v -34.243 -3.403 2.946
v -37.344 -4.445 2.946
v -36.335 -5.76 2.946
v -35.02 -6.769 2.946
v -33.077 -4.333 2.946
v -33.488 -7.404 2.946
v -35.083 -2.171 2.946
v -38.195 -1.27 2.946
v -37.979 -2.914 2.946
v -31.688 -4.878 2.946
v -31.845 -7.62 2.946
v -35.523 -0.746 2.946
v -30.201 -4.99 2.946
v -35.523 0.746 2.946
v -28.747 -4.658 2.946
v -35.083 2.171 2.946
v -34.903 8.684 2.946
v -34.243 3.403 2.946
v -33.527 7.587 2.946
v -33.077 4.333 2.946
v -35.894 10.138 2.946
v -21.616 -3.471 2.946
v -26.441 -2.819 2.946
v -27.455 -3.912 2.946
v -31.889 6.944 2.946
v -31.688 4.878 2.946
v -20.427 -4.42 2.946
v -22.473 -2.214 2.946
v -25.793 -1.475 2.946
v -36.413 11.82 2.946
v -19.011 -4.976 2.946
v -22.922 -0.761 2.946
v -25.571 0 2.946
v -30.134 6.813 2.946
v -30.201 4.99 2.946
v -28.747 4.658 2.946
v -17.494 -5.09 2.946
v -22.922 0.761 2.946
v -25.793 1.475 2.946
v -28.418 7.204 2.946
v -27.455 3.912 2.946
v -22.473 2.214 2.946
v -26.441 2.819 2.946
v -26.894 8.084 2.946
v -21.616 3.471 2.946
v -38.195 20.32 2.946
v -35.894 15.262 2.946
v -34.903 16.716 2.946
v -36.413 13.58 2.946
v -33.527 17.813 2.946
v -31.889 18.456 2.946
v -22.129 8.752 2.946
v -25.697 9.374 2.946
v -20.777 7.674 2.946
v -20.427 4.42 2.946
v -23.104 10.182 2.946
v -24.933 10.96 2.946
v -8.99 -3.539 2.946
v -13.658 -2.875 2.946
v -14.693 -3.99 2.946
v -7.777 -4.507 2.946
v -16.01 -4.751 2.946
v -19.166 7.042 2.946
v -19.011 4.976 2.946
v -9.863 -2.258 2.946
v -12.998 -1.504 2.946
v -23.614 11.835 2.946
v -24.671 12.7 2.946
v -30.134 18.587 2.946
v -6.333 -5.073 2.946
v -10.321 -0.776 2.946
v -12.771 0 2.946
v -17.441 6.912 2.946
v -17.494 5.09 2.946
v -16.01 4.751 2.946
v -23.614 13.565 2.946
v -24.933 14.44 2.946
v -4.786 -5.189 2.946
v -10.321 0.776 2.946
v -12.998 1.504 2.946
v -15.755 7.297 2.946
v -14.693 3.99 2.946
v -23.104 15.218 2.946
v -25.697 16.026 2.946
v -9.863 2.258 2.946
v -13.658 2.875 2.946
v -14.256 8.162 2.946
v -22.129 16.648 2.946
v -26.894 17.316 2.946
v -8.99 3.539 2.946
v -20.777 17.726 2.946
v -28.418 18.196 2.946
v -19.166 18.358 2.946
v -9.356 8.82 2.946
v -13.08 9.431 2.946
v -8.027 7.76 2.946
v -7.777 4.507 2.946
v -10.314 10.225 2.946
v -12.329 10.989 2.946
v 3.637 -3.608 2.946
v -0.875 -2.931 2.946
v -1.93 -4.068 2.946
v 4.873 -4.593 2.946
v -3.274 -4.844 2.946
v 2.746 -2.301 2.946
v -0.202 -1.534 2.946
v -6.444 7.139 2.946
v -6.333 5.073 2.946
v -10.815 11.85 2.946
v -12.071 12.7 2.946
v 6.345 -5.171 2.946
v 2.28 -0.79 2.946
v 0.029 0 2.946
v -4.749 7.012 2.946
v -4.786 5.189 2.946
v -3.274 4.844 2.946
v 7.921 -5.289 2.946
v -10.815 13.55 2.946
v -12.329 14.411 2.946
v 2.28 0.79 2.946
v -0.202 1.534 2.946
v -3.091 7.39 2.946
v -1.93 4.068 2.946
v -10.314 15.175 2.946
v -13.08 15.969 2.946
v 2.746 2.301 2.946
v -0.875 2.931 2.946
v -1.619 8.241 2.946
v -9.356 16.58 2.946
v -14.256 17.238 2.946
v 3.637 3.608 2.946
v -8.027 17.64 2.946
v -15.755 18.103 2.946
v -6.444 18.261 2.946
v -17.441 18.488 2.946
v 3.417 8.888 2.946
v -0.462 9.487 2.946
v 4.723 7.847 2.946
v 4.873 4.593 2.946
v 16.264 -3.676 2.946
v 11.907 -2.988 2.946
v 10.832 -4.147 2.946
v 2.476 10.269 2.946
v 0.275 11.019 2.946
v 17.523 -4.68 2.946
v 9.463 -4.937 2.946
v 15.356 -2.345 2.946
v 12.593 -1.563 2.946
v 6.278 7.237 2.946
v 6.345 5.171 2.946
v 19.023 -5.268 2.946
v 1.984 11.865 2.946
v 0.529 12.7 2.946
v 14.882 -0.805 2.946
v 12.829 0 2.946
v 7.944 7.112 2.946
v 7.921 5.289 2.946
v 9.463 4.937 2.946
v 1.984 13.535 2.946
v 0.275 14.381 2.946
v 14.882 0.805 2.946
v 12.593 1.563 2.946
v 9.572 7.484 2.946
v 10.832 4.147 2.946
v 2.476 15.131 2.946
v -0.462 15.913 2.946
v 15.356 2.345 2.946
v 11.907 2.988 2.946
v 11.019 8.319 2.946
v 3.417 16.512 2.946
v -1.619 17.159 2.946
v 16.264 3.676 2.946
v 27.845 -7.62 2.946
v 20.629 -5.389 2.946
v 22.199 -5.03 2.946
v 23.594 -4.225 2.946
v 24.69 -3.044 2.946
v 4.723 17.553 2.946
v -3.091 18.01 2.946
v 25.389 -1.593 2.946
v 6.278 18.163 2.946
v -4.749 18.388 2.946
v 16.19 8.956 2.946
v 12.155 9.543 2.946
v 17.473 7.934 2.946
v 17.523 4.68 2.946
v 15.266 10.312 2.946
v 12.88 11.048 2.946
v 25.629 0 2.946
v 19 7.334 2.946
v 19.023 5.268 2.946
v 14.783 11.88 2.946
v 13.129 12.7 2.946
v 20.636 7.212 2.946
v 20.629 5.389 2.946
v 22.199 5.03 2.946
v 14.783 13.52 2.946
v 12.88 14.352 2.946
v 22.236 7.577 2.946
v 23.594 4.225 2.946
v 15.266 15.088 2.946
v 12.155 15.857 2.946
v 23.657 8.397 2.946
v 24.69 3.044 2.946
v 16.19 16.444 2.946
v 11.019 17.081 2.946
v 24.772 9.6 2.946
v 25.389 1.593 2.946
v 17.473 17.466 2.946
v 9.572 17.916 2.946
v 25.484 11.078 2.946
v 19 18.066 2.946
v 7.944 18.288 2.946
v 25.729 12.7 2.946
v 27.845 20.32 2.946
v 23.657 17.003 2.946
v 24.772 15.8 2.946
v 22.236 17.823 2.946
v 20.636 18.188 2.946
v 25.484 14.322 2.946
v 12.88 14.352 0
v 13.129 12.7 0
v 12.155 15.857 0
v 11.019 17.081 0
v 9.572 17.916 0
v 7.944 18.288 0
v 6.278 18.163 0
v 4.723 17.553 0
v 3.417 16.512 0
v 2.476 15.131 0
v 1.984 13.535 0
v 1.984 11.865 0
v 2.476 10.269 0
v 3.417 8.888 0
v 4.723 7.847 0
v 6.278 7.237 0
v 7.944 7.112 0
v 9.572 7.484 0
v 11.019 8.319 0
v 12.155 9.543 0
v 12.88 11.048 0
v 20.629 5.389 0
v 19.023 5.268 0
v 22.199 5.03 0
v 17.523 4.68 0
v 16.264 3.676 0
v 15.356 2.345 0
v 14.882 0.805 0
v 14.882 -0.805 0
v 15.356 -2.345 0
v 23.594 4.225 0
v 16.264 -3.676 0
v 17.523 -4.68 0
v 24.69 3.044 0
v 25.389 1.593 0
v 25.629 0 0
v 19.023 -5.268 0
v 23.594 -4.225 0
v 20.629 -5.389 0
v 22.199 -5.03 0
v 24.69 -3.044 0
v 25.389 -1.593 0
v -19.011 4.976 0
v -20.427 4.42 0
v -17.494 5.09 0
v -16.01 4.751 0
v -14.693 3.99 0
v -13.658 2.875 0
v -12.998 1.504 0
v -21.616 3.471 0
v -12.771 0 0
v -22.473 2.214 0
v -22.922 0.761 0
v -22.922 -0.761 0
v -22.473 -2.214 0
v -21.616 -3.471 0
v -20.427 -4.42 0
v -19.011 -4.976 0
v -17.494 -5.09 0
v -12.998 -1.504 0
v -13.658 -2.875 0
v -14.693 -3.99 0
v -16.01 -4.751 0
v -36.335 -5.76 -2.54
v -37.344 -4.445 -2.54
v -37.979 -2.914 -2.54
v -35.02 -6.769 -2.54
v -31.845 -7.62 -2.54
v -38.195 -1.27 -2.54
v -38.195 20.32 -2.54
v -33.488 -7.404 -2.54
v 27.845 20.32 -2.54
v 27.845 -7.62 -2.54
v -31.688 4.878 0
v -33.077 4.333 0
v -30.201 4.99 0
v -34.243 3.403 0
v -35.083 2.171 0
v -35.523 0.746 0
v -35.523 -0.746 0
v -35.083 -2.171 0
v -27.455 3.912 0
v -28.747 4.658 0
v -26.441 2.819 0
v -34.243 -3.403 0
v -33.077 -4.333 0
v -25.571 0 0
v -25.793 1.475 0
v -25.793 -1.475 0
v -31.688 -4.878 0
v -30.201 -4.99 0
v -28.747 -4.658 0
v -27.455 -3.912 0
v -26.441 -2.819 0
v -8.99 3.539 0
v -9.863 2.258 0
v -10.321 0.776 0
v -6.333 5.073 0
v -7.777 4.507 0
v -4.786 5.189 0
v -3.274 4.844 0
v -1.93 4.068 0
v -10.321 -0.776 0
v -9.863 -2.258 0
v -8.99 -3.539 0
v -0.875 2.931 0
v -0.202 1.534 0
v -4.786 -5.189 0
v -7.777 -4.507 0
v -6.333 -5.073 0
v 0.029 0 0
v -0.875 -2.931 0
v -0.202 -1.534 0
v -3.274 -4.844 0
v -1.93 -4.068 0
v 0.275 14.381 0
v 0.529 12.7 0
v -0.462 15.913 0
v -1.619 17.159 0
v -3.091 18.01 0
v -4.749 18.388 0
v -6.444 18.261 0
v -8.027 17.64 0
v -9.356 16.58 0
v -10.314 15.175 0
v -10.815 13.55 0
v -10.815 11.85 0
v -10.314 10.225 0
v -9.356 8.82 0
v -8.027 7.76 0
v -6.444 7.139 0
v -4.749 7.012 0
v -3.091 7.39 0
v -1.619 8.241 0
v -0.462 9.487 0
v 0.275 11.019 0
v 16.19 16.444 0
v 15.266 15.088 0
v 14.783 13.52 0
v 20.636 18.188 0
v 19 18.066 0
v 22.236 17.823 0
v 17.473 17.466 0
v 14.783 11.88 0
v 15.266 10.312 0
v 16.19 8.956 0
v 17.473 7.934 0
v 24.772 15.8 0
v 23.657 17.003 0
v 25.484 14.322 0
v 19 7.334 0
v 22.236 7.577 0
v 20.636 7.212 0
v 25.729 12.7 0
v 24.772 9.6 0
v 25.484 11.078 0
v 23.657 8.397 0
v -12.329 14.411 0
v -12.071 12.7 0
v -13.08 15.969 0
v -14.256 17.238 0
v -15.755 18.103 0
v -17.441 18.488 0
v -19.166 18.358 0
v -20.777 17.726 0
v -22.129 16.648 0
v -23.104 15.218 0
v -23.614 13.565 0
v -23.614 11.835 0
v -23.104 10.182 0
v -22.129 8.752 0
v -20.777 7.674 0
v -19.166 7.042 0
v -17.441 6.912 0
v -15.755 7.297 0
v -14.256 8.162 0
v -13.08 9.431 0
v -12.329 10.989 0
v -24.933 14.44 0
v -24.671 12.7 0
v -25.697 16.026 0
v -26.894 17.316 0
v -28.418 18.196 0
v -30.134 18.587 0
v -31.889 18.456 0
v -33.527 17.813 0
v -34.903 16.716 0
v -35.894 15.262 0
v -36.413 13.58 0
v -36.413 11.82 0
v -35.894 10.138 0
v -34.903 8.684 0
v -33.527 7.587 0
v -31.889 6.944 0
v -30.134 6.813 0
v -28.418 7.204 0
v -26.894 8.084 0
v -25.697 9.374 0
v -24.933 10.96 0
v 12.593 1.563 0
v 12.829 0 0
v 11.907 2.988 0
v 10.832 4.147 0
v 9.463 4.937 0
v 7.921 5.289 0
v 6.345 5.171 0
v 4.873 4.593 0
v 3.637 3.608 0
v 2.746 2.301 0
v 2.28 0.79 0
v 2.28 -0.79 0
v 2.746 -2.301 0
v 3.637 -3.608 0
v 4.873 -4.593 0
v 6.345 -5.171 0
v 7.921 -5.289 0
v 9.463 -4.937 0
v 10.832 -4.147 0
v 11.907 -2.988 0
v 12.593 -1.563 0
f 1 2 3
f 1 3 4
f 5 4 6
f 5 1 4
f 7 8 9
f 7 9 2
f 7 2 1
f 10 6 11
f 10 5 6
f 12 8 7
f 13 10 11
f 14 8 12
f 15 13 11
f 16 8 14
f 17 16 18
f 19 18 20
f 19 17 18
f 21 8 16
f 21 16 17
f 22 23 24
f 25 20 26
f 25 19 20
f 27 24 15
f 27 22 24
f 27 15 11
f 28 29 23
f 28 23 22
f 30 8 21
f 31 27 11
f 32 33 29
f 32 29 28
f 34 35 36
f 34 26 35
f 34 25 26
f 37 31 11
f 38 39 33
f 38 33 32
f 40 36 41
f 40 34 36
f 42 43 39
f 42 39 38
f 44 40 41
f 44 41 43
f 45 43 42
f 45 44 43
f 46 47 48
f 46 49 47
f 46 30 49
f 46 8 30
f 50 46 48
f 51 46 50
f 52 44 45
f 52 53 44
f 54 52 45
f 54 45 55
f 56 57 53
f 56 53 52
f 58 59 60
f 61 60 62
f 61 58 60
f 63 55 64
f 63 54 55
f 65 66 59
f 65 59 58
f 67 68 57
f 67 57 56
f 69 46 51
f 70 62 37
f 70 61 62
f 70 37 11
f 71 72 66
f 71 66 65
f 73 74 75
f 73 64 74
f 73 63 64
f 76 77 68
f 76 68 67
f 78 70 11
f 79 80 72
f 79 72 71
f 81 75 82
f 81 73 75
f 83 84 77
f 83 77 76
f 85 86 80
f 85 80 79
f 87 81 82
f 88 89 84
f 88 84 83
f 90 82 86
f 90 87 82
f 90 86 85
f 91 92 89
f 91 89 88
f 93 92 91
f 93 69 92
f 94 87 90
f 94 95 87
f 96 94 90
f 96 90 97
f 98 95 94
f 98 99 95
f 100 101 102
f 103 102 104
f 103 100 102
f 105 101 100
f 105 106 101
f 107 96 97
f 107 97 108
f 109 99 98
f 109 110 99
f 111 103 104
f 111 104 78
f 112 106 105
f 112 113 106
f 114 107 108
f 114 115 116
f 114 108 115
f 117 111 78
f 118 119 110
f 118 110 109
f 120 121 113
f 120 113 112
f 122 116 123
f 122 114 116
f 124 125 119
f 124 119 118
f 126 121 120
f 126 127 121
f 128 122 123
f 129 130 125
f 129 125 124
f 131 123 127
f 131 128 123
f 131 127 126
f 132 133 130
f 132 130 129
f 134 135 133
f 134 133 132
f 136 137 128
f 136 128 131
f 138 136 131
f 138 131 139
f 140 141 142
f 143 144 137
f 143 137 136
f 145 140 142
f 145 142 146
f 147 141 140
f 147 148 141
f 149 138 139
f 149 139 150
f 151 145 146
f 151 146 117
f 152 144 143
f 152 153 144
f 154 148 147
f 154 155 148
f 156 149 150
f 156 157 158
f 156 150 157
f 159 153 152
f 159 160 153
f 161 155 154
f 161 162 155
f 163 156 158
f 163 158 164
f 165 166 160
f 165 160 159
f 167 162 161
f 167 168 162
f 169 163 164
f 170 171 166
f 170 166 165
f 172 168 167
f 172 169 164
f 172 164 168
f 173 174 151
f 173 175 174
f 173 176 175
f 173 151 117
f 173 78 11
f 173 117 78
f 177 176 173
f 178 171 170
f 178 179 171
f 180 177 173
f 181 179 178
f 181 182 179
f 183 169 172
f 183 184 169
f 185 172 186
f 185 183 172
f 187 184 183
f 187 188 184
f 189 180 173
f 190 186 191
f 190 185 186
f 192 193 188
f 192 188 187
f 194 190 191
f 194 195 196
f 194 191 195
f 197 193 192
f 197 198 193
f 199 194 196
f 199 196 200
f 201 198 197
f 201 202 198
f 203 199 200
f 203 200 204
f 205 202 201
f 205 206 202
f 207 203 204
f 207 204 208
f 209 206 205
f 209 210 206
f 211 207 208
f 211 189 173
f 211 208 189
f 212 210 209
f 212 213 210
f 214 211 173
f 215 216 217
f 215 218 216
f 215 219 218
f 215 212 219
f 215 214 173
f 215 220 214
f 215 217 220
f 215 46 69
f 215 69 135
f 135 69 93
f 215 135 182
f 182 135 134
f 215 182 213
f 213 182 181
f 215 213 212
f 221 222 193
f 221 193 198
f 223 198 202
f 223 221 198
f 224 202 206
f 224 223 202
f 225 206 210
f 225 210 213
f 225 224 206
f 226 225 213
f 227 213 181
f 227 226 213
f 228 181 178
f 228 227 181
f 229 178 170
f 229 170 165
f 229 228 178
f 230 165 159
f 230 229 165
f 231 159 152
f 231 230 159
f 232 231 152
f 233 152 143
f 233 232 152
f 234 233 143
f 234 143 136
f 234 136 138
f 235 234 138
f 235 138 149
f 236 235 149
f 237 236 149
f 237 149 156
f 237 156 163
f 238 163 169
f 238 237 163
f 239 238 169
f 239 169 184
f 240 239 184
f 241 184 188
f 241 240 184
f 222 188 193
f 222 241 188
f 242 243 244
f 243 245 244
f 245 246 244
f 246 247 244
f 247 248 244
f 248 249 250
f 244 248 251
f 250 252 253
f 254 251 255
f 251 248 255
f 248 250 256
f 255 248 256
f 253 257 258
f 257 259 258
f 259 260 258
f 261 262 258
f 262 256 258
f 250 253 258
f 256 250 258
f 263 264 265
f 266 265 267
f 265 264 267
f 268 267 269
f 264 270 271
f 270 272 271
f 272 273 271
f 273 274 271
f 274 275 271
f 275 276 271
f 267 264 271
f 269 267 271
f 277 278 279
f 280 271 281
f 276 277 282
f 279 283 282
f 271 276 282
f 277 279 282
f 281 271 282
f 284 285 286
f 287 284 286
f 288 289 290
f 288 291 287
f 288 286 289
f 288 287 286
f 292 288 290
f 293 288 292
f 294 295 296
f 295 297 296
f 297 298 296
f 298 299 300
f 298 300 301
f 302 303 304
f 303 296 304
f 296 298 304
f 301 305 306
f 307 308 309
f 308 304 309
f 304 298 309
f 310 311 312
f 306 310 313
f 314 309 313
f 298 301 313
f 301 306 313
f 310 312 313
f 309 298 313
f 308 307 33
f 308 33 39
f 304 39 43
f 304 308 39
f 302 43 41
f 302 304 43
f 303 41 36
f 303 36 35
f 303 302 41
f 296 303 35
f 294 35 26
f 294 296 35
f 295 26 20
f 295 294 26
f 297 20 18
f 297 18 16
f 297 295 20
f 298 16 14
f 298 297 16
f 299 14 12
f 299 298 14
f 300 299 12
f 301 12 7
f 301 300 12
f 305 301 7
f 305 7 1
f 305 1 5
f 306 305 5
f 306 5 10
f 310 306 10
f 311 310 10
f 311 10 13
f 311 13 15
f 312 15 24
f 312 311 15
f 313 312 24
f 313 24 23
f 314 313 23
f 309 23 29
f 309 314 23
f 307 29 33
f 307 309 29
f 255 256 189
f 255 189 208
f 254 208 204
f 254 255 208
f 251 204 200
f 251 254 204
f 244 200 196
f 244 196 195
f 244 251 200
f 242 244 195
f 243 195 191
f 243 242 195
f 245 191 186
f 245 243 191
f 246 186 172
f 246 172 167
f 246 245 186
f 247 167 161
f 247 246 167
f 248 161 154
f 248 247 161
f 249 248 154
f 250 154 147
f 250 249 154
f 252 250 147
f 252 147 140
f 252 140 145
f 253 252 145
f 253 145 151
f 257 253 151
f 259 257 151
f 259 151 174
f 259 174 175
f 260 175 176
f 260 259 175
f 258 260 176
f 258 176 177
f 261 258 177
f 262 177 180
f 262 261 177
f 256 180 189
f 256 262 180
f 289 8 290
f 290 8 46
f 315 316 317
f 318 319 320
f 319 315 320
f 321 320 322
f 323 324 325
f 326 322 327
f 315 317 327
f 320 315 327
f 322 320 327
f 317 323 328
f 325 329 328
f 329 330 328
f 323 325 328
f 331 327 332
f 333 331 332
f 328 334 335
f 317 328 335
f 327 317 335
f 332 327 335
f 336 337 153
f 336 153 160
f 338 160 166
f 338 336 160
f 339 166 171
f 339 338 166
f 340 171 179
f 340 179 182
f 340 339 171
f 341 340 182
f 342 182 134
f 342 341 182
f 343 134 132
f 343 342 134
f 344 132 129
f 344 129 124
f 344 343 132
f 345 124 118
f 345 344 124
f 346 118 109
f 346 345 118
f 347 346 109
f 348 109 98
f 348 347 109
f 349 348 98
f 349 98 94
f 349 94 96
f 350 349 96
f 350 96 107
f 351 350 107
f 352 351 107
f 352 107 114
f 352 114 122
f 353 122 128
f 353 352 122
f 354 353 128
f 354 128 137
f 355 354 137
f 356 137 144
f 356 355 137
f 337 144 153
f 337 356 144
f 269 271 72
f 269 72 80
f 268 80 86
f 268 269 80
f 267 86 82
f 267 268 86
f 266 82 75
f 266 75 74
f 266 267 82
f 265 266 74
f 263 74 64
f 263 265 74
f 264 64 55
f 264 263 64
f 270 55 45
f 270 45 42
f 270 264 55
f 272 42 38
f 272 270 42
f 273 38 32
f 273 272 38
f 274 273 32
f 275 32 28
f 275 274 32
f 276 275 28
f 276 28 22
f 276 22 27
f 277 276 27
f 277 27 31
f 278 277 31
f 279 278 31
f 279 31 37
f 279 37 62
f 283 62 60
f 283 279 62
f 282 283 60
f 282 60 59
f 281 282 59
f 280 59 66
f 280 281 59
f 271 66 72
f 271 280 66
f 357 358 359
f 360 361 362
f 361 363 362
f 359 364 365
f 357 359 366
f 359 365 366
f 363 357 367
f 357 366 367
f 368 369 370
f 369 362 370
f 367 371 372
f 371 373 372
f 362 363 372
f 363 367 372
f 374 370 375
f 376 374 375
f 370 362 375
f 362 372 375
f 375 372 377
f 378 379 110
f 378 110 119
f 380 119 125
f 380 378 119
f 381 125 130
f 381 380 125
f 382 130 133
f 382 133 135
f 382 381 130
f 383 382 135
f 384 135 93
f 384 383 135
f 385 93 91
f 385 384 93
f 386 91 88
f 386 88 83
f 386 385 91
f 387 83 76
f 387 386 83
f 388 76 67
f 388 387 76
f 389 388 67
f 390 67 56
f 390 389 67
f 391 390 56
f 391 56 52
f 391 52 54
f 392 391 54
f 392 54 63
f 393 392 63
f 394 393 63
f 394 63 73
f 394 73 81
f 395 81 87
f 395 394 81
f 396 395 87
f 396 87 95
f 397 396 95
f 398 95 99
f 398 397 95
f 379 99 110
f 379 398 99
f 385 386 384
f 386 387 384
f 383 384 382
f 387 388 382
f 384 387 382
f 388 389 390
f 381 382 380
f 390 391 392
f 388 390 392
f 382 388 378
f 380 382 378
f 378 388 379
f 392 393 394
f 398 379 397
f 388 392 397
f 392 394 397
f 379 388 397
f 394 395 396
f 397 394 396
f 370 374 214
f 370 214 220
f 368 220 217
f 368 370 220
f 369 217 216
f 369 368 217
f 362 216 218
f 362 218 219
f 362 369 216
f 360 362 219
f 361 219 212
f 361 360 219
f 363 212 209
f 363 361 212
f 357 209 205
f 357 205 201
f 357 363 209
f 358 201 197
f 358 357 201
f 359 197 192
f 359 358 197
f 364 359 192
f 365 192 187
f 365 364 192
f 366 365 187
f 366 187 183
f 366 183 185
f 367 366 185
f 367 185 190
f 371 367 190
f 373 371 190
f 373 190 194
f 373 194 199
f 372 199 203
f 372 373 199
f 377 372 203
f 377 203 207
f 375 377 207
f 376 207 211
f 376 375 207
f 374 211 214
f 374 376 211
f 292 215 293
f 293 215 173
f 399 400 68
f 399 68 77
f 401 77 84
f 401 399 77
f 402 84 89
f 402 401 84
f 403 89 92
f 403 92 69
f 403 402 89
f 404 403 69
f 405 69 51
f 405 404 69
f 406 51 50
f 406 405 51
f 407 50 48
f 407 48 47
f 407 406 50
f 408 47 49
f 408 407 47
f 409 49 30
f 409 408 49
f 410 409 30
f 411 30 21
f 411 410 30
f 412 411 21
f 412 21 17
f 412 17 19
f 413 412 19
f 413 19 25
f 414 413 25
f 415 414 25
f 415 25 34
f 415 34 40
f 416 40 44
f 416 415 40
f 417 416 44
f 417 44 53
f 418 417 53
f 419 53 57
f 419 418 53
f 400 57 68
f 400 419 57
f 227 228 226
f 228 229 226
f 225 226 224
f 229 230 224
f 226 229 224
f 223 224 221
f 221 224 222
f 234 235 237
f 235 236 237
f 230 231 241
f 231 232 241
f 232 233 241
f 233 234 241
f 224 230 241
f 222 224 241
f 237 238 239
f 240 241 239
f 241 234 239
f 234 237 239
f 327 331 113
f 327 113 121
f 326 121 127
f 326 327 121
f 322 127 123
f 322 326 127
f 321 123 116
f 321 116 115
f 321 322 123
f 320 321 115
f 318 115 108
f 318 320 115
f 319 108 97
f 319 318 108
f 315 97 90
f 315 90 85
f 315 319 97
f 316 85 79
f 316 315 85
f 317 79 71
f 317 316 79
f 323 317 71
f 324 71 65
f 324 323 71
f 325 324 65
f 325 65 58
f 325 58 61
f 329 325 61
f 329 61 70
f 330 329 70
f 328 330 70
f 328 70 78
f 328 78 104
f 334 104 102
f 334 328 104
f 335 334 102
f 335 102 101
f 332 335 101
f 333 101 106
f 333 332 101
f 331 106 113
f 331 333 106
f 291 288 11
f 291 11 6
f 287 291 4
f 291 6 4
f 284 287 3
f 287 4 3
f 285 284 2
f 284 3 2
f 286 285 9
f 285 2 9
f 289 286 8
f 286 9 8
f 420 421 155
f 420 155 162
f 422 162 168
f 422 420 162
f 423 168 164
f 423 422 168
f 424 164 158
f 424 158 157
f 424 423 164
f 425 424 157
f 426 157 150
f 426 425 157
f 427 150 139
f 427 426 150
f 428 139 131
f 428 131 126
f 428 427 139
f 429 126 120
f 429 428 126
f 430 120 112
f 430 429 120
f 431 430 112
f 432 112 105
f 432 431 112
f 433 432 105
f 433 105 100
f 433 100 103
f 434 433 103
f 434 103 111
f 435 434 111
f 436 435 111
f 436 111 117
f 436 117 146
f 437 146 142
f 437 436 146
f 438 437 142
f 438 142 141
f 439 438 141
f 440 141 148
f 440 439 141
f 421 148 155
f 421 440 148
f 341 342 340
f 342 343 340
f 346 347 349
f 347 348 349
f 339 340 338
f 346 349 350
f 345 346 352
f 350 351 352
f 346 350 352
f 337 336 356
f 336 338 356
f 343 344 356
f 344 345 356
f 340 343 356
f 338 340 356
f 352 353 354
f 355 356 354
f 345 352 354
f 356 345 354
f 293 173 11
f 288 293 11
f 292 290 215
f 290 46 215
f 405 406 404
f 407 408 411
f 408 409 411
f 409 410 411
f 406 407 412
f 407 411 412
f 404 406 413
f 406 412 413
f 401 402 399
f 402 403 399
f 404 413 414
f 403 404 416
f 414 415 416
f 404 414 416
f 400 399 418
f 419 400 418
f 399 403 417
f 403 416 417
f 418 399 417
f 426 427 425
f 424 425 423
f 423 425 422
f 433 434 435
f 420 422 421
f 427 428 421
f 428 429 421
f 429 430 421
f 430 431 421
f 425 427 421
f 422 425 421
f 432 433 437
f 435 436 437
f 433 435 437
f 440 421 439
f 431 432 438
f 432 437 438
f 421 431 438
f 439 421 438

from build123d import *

# Parameters (mm, degrees)
F0_R     = 5.0038
F0_R_2   = 5.1038
F0_R_3   = 5.2038
F0_R_4   = 5.3038
F0_R_5   = 5.4038
F0_R_6   = 5.9038
F0_R_7   = 5.8038
F0_R_8   = 5.7038
F0_R_9   = 5.6038
F0_R_10  = 5.5038
F1_DEPTH = 2.9464
F2_R     = 5.9038
F2_R_2   = 5.8038
F2_R_3   = 5.7038
F2_R_4   = 5.6038
F2_R_5   = 5.5038
F2_R_6   = 5.0038
F2_R_7   = 5.1038
F2_R_8   = 5.2038
F2_R_9   = 5.3038
F2_R_10  = 5.4038
F3_DEPTH = 2.54


with BuildPart() as f1:
    # F0 (on Top) → F1 (new body)
    with BuildSketch(Plane.XY):
        with BuildLine():
            Line((27.8450359044, 20.32), (-38.1949640956, 20.32))
            Line((-38.1949640956, 20.32), (-38.1949640956, -1.27))
            ThreePointArc((-38.1949640956, -1.27), (-36.3350921561, -5.7601280605), (-31.8449640956, -7.62))
            Line((-31.8449640956, -7.62), (27.8450359044, -7.62))
            Line((27.8450359044, -7.62), (27.8450359044, 20.32))
        make_face()
        with Locations((-30.5749640956, 0)):
            Circle(F0_R, mode=Mode.SUBTRACT)
        with Locations((-17.8749640956, 0)):
            Circle(F0_R_2, mode=Mode.SUBTRACT)
        with Locations((-5.1749640956, 0)):
            Circle(F0_R_3, mode=Mode.SUBTRACT)
        with Locations((7.5250359044, 0)):
            Circle(F0_R_4, mode=Mode.SUBTRACT)
        with Locations((20.2250359044, 0)):
            Circle(F0_R_5, mode=Mode.SUBTRACT)
        with Locations((-30.5749640956, 12.7)):
            Circle(F0_R_6, mode=Mode.SUBTRACT)
        with Locations((-17.8749640956, 12.7)):
            Circle(F0_R_7, mode=Mode.SUBTRACT)
        with Locations((-5.1749640956, 12.7)):
            Circle(F0_R_8, mode=Mode.SUBTRACT)
        with Locations((7.5250359044, 12.7)):
            Circle(F0_R_9, mode=Mode.SUBTRACT)
        with Locations((20.2250359044, 12.7)):
            Circle(F0_R_10, mode=Mode.SUBTRACT)
    extrude(amount=F1_DEPTH)

    # F2 (on face) → F3 (join)
    with BuildSketch(Plane(origin=(0, 0, 0), x_dir=(1, 0, 0), z_dir=(0, 0, -1))):
        with BuildLine():
            Line((-38.1949640956, 1.27), (-38.1949640956, -20.32))
            Line((-38.1949640956, -20.32), (27.8450359044, -20.32))
            Line((27.8450359044, -20.32), (27.8450359044, 7.62))
            Line((27.8450359044, 7.62), (-31.8449640956, 7.62))
            ThreePointArc((-31.8449640956, 7.62), (-36.3350921561, 5.7601280605), (-38.1949640956, 1.27))
        make_face()
        with Locations((-30.5749640956, -12.7)):
            Circle(F2_R, mode=Mode.SUBTRACT)
        with Locations((-17.8749640956, -12.7)):
            Circle(F2_R_2, mode=Mode.SUBTRACT)
        with Locations((-5.1749640956, -12.7)):
            Circle(F2_R_3, mode=Mode.SUBTRACT)
        with Locations((7.5250359044, -12.7)):
            Circle(F2_R_4, mode=Mode.SUBTRACT)
        with Locations((20.2250359044, -12.7)):
            Circle(F2_R_5, mode=Mode.SUBTRACT)
        with Locations((-30.5749640956, 0)):
            Circle(F2_R_6, mode=Mode.SUBTRACT)
        with Locations((-17.8749640956, 0)):
            Circle(F2_R_7, mode=Mode.SUBTRACT)
        with Locations((-5.1749640956, 0)):
            Circle(F2_R_8, mode=Mode.SUBTRACT)
        with Locations((7.5250359044, 0)):
            Circle(F2_R_9, mode=Mode.SUBTRACT)
        with Locations((20.2250359044, 0)):
            Circle(F2_R_10, mode=Mode.SUBTRACT)
        with Locations((-30.5749640956, 0)):
            Circle(F2_R_6)
        with Locations((-30.5749640956, -12.7)):
            Circle(F2_R)
        with Locations((-17.8749640956, -12.7)):
            Circle(F2_R_2)
        with Locations((-17.8749640956, 0)):
            Circle(F2_R_7)
        with Locations((-5.1749640956, 0)):
            Circle(F2_R_8)
        with Locations((-5.1749640956, -12.7)):
            Circle(F2_R_3)
        with Locations((7.5250359044, -12.7)):
            Circle(F2_R_4)
        with Locations((7.5250359044, 0)):
            Circle(F2_R_9)
        with Locations((20.2250359044, 0)):
            Circle(F2_R_10)
        with Locations((20.2250359044, -12.7)):
            Circle(F2_R_5)
    extrude(amount=F3_DEPTH)


solid = f1.part
